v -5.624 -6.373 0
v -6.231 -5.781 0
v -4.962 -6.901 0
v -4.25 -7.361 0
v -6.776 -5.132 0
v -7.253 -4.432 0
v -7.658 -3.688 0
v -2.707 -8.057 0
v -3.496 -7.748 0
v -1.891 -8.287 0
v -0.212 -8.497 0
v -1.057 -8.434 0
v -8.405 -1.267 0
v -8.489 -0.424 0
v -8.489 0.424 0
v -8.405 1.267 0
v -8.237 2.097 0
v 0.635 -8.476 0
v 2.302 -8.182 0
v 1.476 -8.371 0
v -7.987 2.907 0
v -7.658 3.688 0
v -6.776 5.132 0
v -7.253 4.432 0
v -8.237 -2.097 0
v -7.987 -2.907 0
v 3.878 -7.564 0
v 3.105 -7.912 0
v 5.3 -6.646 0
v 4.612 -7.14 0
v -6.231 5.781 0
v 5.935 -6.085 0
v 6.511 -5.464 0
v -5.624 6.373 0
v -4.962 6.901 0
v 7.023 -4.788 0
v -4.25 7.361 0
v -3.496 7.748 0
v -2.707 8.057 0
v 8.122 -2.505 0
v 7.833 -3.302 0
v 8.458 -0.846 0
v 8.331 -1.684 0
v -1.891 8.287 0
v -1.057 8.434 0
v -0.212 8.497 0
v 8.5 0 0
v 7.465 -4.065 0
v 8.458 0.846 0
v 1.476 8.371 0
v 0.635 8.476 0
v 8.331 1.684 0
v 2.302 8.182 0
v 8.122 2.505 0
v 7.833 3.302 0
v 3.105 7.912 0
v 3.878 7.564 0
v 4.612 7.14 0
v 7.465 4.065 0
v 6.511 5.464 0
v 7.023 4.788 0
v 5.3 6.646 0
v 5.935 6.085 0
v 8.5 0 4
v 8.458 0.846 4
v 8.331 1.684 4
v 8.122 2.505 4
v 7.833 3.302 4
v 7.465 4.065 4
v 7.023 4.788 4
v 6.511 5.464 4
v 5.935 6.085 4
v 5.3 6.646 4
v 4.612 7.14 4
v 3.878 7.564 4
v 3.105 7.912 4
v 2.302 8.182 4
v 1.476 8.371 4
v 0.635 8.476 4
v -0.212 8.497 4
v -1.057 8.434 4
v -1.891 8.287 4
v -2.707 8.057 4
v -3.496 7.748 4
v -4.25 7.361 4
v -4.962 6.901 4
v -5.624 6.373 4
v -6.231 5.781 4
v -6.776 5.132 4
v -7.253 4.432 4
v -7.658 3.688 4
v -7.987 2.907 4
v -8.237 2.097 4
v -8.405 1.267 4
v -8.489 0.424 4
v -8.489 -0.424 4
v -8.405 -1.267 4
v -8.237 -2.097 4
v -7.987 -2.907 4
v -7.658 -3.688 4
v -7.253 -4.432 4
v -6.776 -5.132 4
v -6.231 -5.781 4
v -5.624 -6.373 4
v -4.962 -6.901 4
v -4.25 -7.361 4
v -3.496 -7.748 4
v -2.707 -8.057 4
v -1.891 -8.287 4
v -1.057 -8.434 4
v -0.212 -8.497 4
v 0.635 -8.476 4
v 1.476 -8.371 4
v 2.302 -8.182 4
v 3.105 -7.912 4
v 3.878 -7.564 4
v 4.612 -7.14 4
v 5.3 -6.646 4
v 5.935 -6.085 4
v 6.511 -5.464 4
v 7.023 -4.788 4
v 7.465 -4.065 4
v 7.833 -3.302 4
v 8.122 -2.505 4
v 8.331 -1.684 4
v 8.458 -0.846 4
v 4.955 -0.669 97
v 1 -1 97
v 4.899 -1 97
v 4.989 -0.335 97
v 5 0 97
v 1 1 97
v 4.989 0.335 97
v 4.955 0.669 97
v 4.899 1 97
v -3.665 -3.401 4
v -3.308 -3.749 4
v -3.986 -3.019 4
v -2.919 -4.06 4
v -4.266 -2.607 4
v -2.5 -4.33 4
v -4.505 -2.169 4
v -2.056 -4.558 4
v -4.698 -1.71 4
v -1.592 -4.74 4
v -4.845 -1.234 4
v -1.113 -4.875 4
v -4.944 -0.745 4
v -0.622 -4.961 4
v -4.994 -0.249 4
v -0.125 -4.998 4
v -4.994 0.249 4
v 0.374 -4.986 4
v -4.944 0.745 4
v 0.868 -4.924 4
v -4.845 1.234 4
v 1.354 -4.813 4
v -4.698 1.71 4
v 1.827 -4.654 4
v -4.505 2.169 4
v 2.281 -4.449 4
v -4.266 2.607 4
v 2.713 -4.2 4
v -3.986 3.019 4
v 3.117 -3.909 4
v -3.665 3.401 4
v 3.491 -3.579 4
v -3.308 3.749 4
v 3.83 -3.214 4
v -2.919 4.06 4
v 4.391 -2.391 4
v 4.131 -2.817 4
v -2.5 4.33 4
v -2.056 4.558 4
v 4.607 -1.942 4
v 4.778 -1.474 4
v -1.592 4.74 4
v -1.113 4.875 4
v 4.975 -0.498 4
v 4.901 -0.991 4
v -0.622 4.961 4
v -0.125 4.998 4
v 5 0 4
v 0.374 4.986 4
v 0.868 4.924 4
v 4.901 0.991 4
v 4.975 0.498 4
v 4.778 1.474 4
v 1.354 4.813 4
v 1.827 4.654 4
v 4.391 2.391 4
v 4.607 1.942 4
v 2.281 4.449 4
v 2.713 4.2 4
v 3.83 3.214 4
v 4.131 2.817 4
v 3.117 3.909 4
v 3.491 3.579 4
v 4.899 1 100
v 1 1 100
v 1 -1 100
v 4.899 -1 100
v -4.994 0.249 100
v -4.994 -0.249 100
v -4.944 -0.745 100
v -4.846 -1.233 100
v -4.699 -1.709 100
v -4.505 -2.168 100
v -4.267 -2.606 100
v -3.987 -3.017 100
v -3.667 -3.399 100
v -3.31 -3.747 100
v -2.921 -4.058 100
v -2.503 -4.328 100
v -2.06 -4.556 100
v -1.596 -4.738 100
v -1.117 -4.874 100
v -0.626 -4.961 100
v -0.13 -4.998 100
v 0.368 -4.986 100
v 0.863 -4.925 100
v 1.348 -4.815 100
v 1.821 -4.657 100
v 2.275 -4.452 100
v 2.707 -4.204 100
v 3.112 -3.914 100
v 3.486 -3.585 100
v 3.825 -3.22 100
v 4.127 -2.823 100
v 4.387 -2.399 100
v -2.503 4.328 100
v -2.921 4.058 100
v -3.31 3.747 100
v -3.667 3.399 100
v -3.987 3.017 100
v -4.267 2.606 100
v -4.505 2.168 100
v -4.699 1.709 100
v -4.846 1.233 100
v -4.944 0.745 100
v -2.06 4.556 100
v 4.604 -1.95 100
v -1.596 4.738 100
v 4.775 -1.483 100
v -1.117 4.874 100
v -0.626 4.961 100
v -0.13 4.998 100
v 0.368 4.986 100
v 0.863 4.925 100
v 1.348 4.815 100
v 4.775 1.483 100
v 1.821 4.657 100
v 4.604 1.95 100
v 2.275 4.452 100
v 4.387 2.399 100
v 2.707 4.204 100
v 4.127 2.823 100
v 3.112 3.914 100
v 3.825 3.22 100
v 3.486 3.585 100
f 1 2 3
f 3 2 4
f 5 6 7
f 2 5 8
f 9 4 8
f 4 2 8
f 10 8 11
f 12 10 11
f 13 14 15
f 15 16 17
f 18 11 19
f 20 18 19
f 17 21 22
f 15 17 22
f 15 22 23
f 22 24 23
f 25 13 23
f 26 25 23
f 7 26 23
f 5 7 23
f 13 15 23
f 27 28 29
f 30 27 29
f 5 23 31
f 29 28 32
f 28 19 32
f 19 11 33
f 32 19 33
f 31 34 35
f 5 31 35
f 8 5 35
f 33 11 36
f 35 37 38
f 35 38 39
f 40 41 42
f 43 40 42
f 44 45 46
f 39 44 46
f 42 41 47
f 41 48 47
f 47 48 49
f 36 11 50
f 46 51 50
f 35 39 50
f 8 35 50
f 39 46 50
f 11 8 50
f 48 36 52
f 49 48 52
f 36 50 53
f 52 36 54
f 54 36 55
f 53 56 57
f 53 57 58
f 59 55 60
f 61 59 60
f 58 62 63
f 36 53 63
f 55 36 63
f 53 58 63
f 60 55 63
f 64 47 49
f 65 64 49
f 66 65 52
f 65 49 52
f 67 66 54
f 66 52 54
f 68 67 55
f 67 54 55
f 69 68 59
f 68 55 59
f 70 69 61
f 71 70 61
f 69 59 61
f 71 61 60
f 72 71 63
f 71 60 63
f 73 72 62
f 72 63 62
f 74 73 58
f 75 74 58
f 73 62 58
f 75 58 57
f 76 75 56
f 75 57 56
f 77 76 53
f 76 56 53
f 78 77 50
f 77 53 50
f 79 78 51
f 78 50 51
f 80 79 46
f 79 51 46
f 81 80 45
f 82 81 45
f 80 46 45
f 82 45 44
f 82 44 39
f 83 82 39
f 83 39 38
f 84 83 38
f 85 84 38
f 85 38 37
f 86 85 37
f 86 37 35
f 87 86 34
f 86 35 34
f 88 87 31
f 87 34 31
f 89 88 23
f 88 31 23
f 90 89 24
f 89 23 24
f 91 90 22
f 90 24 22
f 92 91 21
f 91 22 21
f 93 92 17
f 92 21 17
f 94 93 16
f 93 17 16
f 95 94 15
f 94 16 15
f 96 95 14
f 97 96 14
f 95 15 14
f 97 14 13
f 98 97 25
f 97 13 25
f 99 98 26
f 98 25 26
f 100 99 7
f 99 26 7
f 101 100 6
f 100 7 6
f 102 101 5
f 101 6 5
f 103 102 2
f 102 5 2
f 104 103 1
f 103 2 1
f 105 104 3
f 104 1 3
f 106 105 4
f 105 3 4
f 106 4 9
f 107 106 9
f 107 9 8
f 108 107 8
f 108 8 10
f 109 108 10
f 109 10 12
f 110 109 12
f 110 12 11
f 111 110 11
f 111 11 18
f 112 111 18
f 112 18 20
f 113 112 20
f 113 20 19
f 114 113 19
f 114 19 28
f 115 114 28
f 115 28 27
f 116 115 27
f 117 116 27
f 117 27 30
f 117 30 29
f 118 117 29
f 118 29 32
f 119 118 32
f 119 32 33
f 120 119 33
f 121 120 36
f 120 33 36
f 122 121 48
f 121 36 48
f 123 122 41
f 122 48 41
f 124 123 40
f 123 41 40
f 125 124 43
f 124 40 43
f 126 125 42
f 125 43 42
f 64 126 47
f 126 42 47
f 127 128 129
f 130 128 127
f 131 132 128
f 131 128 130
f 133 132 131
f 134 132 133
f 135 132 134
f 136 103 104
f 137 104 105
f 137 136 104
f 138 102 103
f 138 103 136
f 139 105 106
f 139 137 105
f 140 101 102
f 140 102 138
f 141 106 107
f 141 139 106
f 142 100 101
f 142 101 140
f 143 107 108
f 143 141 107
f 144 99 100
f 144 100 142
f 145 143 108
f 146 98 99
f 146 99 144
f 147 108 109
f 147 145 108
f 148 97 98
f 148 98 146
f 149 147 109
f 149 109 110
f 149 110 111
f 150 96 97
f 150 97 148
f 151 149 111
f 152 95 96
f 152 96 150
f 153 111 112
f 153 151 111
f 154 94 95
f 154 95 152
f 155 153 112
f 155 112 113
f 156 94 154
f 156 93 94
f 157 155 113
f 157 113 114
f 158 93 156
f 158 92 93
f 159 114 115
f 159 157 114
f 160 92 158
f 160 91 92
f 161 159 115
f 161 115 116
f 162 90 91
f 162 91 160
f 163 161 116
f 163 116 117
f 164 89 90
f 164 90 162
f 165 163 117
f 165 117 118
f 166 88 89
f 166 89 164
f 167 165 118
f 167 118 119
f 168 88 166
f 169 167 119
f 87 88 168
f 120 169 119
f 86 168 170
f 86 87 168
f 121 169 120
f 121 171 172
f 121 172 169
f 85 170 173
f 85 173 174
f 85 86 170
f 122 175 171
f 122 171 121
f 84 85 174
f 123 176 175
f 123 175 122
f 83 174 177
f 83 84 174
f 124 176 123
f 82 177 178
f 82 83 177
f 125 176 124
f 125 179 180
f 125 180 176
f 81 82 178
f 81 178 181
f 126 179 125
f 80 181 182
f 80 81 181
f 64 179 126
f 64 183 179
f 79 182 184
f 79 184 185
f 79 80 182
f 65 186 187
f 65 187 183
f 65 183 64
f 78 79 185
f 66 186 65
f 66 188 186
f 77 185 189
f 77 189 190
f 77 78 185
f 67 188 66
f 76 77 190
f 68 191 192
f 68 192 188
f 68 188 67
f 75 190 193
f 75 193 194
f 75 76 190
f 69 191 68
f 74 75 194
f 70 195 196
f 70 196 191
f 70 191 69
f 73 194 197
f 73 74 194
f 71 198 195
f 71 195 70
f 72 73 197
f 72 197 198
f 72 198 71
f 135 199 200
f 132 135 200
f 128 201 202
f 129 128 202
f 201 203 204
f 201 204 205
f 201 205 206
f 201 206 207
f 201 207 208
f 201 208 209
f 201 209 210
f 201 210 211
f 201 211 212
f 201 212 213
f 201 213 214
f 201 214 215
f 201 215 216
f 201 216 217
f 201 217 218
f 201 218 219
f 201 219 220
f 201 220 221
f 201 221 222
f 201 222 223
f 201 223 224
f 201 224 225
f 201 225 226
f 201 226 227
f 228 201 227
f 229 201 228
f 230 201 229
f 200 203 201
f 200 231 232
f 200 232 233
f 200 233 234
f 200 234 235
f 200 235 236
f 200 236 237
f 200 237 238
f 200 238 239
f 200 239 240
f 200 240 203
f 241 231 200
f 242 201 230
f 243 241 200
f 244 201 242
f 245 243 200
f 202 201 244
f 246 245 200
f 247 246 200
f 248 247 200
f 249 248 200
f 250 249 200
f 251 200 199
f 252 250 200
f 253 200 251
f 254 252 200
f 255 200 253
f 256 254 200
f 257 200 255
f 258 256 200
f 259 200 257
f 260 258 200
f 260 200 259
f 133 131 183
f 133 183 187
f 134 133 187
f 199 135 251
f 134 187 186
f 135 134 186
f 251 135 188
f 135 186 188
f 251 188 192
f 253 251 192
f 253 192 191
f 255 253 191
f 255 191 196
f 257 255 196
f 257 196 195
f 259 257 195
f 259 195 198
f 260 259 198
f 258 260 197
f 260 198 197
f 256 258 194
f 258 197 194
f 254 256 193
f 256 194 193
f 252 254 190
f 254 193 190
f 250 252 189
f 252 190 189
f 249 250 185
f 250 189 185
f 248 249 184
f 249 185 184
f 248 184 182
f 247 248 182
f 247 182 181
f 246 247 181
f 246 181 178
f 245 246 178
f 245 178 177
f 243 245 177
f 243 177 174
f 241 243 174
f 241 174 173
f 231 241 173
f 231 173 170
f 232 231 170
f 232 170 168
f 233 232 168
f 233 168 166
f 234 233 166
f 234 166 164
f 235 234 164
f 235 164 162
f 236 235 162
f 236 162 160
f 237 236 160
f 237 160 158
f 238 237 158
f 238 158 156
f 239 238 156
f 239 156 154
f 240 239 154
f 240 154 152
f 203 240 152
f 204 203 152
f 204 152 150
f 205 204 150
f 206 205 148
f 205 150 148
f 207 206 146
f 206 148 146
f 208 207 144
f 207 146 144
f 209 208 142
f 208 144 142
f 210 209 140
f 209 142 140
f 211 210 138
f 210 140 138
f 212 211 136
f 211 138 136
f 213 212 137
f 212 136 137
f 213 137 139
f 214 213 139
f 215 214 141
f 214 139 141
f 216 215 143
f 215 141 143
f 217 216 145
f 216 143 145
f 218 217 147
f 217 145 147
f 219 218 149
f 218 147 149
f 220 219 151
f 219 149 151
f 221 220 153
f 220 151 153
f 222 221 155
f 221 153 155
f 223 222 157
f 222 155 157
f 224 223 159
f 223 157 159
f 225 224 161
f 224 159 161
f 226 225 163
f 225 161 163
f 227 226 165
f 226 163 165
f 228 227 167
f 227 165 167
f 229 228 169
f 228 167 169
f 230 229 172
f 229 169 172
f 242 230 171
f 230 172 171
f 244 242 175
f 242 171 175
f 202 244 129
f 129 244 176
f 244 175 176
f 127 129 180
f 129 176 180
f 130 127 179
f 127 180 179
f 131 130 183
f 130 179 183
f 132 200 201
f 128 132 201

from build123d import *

# Parameters (mm, degrees)
F0_R     = 8.5
F1_DEPTH = 4
F2_R     = 5
F3_DEPTH = 100
F5_DEPTH = 3


with BuildPart() as f1:
    # F0 (on Top) → F1 (new body)
    with BuildSketch(Plane.XY):
        Circle(F0_R)
    extrude(amount=F1_DEPTH)

    # F2 (on Top) → F3 (join)
    with BuildSketch(Plane.XY):
        Circle(F2_R)
    extrude(amount=F3_DEPTH)

    # F4 (on face) → F5 (cut)
    with BuildSketch(Plane.XY.offset(100)):
        with BuildLine():
            Line((4.8989794856, 1), (1, 1))
            Line((1, 1), (1, -1))
            Line((1, -1), (4.8989794856, -1))
            ThreePointArc((4.8989794856, -1), (4.974680765, -0.50254481), (5, 0))
            ThreePointArc((5, 0), (4.974680765, 0.50254481), (4.8989794856, 1))
        make_face()
    extrude(amount=-F5_DEPTH, mode=Mode.SUBTRACT)


solid = f1.part
